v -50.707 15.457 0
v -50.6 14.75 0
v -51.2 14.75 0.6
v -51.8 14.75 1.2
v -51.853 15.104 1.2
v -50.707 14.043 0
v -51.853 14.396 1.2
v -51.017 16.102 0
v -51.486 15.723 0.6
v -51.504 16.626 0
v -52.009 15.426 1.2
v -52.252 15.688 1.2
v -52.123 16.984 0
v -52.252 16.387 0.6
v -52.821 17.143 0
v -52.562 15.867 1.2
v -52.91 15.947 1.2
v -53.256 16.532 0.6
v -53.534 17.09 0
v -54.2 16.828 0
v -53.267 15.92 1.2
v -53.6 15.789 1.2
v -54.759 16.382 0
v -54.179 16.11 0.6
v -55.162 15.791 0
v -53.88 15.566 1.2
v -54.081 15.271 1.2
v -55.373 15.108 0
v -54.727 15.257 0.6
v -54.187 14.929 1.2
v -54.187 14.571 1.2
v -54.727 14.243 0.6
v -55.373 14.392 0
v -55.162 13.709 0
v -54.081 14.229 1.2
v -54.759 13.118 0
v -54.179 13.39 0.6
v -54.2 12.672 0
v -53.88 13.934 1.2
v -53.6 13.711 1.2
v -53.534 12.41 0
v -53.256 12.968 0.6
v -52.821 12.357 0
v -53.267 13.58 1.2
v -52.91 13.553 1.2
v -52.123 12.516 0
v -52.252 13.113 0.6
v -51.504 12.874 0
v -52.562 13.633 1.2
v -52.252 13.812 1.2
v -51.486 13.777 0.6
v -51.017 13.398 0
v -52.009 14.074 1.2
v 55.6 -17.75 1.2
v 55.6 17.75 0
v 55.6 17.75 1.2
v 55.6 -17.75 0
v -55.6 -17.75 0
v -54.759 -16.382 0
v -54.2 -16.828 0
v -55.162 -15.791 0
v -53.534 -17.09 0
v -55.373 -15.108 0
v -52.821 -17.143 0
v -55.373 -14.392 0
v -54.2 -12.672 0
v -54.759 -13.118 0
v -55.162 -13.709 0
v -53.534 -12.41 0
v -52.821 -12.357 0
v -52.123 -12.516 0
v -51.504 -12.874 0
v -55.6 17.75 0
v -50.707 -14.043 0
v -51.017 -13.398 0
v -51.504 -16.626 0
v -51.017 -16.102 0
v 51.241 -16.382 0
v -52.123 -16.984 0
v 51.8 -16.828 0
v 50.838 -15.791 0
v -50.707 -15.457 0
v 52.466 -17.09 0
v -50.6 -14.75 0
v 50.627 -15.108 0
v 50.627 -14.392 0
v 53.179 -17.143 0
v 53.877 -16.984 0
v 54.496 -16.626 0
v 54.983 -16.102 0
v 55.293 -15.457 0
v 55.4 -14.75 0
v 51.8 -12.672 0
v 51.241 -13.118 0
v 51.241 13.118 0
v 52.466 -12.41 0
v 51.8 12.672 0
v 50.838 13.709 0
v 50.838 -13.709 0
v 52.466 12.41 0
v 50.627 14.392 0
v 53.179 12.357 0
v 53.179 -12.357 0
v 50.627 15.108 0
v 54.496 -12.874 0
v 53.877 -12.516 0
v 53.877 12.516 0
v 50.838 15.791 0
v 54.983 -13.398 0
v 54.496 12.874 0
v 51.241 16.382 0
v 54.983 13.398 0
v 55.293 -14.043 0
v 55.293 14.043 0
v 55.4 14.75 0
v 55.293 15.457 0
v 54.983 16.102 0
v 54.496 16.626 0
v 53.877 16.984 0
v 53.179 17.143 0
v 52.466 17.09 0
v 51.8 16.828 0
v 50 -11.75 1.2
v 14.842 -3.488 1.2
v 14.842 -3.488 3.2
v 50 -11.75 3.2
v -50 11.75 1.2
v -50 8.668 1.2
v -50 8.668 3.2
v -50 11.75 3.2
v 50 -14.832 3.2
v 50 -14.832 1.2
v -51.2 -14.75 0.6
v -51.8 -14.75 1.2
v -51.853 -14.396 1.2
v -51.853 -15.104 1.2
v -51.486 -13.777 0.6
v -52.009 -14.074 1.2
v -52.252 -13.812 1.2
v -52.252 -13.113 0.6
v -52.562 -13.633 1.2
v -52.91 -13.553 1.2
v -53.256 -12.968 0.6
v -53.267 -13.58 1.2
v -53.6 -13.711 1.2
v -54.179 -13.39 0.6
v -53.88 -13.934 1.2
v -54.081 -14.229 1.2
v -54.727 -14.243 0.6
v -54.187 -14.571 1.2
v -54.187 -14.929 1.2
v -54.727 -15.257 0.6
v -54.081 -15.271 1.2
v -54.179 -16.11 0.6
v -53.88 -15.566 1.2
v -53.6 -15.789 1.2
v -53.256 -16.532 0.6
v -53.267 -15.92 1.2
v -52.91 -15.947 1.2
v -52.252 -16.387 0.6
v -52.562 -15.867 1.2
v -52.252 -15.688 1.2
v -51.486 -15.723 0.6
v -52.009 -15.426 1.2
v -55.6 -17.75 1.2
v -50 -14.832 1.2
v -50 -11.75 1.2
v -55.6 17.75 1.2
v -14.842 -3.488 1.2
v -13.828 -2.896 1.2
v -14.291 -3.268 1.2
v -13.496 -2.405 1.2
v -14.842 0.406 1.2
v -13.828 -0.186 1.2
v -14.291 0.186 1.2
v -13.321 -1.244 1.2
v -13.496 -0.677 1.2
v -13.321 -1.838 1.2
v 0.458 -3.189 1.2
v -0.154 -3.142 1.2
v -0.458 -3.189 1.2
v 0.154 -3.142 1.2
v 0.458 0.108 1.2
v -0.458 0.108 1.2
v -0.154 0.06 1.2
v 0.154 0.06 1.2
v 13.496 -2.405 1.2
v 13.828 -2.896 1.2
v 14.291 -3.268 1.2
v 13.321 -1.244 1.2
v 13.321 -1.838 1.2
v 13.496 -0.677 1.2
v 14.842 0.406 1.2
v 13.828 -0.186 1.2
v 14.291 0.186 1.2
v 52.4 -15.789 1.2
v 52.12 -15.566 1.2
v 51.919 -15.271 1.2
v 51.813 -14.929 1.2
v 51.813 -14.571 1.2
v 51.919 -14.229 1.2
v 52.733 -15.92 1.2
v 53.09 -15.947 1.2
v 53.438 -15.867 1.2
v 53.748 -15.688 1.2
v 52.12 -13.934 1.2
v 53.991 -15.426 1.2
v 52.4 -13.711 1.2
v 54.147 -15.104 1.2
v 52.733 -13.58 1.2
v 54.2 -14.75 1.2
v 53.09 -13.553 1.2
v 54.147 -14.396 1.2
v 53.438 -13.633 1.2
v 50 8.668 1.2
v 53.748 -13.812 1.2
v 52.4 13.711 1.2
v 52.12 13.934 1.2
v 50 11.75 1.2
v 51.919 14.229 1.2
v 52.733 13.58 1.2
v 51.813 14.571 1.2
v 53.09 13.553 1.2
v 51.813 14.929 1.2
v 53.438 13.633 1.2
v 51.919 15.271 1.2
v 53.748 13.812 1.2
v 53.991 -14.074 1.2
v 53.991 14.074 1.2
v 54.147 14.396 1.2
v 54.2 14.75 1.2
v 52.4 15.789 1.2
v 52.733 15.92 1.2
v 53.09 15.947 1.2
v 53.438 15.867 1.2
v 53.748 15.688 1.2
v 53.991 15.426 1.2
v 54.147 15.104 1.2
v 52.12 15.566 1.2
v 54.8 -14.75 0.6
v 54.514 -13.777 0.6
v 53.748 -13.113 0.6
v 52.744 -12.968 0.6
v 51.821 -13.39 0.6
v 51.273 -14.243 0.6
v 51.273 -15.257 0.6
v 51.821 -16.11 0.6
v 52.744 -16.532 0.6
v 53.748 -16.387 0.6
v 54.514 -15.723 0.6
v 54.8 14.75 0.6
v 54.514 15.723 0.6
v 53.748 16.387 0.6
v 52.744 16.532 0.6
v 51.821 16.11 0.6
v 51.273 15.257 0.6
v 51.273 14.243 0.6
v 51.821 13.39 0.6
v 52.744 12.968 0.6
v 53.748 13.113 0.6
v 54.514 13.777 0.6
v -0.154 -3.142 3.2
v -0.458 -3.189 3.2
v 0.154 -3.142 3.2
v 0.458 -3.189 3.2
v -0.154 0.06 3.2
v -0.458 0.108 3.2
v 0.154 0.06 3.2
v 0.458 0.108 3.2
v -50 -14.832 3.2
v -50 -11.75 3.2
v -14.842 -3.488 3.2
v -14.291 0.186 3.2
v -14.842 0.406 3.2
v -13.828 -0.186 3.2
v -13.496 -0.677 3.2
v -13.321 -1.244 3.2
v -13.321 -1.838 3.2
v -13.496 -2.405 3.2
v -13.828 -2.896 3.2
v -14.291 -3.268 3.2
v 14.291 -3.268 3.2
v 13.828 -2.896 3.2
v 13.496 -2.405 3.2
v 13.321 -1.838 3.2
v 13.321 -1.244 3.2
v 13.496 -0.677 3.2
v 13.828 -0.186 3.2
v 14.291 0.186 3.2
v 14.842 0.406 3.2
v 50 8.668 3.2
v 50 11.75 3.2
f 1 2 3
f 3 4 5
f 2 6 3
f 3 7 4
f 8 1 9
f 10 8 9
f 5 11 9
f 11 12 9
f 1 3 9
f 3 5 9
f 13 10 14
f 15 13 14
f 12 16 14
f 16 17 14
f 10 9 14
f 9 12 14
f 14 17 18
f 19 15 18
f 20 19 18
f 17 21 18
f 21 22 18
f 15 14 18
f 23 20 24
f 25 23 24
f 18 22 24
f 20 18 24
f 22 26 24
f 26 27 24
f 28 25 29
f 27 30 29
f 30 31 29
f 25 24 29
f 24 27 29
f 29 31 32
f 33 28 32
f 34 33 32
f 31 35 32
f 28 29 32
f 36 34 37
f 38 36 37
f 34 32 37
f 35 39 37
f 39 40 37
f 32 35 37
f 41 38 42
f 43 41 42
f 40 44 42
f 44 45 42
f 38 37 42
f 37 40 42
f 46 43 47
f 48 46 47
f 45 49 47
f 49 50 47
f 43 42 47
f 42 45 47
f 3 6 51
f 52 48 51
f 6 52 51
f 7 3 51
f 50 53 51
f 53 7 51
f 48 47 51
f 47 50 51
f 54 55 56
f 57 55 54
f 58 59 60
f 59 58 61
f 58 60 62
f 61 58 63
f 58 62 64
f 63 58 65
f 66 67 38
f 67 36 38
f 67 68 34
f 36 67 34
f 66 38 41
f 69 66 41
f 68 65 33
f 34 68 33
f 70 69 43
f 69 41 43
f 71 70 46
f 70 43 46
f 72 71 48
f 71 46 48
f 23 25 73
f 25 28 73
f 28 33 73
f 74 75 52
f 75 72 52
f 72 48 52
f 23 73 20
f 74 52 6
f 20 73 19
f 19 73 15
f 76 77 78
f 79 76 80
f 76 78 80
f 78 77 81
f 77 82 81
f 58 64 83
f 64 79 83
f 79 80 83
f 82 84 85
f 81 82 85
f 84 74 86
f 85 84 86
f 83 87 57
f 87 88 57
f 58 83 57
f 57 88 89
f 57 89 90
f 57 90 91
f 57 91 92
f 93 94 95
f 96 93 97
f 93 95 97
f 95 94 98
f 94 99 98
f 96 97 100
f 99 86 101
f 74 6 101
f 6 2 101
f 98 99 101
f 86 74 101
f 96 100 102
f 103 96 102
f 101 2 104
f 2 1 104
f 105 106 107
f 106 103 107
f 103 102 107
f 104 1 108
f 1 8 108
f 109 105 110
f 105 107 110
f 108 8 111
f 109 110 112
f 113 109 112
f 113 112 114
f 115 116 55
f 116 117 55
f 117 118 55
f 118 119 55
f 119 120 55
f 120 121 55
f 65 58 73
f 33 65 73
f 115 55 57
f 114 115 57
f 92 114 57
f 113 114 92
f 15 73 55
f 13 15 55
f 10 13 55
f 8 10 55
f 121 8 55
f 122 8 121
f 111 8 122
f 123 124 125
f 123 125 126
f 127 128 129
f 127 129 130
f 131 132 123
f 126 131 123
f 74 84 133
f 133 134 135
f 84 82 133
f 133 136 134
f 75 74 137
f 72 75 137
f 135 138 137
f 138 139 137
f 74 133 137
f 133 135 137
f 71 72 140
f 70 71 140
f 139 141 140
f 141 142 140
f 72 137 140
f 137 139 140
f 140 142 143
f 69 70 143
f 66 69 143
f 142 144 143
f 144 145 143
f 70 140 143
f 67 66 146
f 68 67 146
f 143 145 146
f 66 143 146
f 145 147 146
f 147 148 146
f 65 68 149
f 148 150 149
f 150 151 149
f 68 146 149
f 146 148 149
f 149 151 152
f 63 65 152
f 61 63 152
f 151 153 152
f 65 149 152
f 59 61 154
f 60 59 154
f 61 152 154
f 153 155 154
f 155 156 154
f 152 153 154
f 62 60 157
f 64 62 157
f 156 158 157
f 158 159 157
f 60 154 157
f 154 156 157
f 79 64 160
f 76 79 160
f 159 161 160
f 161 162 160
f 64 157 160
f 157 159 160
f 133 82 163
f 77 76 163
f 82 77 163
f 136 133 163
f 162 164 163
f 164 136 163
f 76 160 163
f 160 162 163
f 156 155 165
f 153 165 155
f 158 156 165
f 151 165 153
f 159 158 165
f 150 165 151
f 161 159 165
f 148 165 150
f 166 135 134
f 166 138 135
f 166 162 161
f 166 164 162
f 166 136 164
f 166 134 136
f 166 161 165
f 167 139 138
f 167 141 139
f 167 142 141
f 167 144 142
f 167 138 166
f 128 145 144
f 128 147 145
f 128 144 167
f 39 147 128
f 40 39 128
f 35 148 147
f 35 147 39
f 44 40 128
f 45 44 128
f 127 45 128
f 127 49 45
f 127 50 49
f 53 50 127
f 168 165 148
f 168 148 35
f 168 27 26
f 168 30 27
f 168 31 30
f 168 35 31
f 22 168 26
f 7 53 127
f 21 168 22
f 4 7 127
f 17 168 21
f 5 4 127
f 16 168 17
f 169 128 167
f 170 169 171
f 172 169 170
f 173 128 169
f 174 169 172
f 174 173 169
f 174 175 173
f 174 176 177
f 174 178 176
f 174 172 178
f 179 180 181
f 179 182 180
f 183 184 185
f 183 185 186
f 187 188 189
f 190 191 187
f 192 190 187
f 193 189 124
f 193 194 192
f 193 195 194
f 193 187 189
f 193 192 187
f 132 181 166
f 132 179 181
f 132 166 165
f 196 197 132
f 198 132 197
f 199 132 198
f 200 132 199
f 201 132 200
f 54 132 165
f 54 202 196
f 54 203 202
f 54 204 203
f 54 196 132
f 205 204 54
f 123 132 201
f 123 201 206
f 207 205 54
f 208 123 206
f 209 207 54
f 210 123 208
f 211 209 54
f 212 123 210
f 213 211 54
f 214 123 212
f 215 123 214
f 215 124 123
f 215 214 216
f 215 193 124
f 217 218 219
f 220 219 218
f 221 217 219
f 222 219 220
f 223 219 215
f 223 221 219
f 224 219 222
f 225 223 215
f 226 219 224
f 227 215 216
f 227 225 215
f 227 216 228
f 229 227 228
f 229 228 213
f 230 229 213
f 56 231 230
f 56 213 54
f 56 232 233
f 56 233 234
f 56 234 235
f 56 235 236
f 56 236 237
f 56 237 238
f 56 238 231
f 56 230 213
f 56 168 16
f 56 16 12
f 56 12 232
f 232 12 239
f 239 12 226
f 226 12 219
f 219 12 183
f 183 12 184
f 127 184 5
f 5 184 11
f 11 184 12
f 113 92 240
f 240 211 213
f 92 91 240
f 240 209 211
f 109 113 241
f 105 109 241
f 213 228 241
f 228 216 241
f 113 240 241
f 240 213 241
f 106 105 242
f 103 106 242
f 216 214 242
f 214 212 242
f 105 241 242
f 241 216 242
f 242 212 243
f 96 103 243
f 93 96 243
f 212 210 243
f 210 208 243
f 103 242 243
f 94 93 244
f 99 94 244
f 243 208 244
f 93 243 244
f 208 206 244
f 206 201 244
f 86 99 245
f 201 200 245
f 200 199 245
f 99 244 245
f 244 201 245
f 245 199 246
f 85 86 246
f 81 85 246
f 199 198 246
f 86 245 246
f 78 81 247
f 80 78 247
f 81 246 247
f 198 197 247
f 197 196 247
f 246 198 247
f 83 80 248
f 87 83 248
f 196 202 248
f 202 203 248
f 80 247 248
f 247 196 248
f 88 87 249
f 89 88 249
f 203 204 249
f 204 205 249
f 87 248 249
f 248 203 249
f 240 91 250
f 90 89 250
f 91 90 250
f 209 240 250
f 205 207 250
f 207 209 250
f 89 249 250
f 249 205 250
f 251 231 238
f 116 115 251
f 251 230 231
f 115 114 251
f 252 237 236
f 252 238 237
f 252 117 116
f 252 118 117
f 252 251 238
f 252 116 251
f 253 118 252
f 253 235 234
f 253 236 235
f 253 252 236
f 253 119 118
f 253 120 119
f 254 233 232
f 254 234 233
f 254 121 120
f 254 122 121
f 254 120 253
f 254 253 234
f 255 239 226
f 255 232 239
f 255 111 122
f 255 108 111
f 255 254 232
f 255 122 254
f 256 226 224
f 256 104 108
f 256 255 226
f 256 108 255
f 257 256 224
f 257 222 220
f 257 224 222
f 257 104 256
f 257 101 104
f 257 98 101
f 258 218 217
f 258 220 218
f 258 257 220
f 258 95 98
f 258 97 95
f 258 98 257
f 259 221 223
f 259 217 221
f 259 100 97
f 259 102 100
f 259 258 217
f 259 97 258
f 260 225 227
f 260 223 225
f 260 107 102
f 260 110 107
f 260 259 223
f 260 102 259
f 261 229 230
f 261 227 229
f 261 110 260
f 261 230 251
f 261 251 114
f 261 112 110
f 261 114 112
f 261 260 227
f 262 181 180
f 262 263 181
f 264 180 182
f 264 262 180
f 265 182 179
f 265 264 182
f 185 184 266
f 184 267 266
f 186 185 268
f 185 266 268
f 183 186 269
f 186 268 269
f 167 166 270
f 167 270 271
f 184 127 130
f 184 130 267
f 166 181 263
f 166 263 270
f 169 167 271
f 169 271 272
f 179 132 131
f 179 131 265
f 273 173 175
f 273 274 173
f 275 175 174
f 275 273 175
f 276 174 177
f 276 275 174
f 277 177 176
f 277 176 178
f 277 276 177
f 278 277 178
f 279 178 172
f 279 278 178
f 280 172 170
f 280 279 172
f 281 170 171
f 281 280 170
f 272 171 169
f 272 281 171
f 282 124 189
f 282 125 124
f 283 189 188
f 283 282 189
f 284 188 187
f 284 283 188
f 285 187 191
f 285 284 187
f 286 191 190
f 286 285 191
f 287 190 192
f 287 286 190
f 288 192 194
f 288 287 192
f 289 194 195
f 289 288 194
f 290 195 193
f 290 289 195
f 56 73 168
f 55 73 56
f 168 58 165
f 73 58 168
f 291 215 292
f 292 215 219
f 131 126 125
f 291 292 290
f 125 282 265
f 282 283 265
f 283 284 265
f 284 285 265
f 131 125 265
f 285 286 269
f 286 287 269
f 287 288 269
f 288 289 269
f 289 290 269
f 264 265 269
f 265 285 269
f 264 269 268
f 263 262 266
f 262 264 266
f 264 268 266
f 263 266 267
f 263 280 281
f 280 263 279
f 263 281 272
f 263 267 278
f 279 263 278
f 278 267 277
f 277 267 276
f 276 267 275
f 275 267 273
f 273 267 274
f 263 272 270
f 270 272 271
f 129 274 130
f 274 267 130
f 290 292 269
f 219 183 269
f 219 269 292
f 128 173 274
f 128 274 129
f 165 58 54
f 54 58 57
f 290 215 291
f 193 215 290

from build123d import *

# Parameters (mm, degrees)
SKETCH1_W                       = 112
SKETCH1_H                       = 35.5
BOSS_EXTRUDE1_DEPTH             = 1.2
SKETCH2_W                       = 6
SKETCH2_H                       = 6
BOSS_EXTRUDE2_DEPTH             = 2
SKETCH3_R                       = 1.1
CUT_EXTRUDE1_DEPTH              = 59.83283522
SKETCH7_W                       = 0.4
SKETCH7_H                       = 35.5
CUT_EXTRUDE5_DEPTH              = 59.83283522
AUFSATZ_LINEAR_AUSTRAGEN2_DEPTH = 2
VERRUNDUNG1_R                   = 2
SKETCH8_W                       = 5.6
SKETCH8_H                       = 35.5
CUT_EXTRUDE7_DEPTH              = 2
CHAMFER1_SIZE                   = 1.3


with BuildPart() as part:
    # Sketch1 → Boss-Extrude1 (new body)
    with BuildSketch(Plane.XY):
        Rectangle(SKETCH1_W, SKETCH1_H)
    extrude(amount=BOSS_EXTRUDE1_DEPTH)

    # Sketch2 → Boss-Extrude2 (add)
    with BuildSketch(Plane.XY.offset(1.2)):
        with Locations((-53, 14.75)):
            Rectangle(SKETCH2_W, SKETCH2_H)
        with Locations((-53, -14.75)):
            Rectangle(SKETCH2_W, SKETCH2_H)
        with Locations((53, -14.75)):
            Rectangle(SKETCH2_W, SKETCH2_H)
        with Locations((53, 14.75)):
            Rectangle(SKETCH2_W, SKETCH2_H)
    extrude(amount=BOSS_EXTRUDE2_DEPTH)

    # Sketch3 → Cut-Extrude1 (cut, through all)
    with BuildSketch(Plane.XY.offset(3.2)):
        with Locations((-53, 14.75)):
            Circle(SKETCH3_R)
        with Locations((-53, -14.75)):
            Circle(SKETCH3_R)
        with Locations((53, -14.75)):
            Circle(SKETCH3_R)
        with Locations((53, 14.75)):
            Circle(SKETCH3_R)
    extrude(amount=-CUT_EXTRUDE1_DEPTH, mode=Mode.SUBTRACT)

    # Sketch7 → Cut-Extrude5 (cut, through all)
    with BuildSketch(Plane(origin=(0, 0, 0), x_dir=(-1, 0, 0), z_dir=(0, 0, -1))):
        with Locations((-55.8, 0)):
            Rectangle(SKETCH7_W, SKETCH7_H)
        with Locations((55.8, 0)):
            Rectangle(SKETCH7_W, SKETCH7_H)
    extrude(amount=-CUT_EXTRUDE5_DEPTH, mode=Mode.SUBTRACT)

    # Skizze5 → Aufsatz-Linear austragen2 (add)
    with BuildSketch(Plane.XY.offset(1.2)):
        Polygon((-50, 11.75), (0, 0), (50, 11.75), (55.6, 11.75), (55.6, 9.984275645), (6.55686033, -1.540862177), (50, -11.75), (50, -14.831724355), (0, -3.081724355), (-50, -14.831724355), (-50, -11.75), (-6.55686033, -1.540862177), (-55.6, 9.984275645), (-55.6, 11.75), align=None)
    extrude(amount=AUFSATZ_LINEAR_AUSTRAGEN2_DEPTH)

    # Verrundung1
    verrundung1_edges = [part.edges().sort_by_distance(p)[0] for p in [
        (-6.55686033, -1.540862177, 2.2),
        (0, -3.081724355, 2.2),
        (6.55686033, -1.540862177, 2.2),
        (0, 0, 2.2),
    ]]
    fillet(verrundung1_edges, radius=VERRUNDUNG1_R)

    # Sketch8 → Cut-Extrude7 (cut)
    with BuildSketch(Plane.XY.offset(1.2)):
        with Locations((-52.8, 0)):
            Rectangle(SKETCH8_W, SKETCH8_H)
        with Locations((52.8, 0)):
            Rectangle(SKETCH8_W, SKETCH8_H)
    extrude(amount=CUT_EXTRUDE7_DEPTH, mode=Mode.SUBTRACT)

    # Chamfer1
    # the kernel refuses this chamfer: 1.3 mm, written as the material it takes off along each edge
    with BuildSketch(Plane(origin=(53, 14.75, 0), x_dir=(1, 0, 0), z_dir=(0, -1, 0))) as chamfer1_piece_1:
        Polygon((1.1, CHAMFER1_SIZE), (1.1 + CHAMFER1_SIZE, 0), (1.1, 0), align=None)
    revolve(axis=Axis((53, 14.75, 0), (0, 0, 1)), mode=Mode.SUBTRACT)
    with BuildSketch(Plane(origin=(-53, -14.75, 0), x_dir=(1, 0, 0), z_dir=(0, -1, 0))) as chamfer1_piece_2:
        Polygon((1.1 + CHAMFER1_SIZE, 0), (1.1, CHAMFER1_SIZE), (1.1, 0), align=None)
    revolve(axis=Axis((-53, -14.75, 0), (0, 0, 1)), mode=Mode.SUBTRACT)
    with BuildSketch(Plane(origin=(-53, 14.75, 0), x_dir=(1, 0, 0), z_dir=(0, -1, 0))) as chamfer1_piece_3:
        Polygon((1.1 + CHAMFER1_SIZE, 0), (1.1, CHAMFER1_SIZE), (1.1, 0), align=None)
    revolve(axis=Axis((-53, 14.75, 0), (0, 0, 1)), mode=Mode.SUBTRACT)
    with BuildSketch(Plane(origin=(53, -14.75, 0), x_dir=(1, 0, 0), z_dir=(0, -1, 0))) as chamfer1_piece_4:
        Polygon((1.1 + CHAMFER1_SIZE, 0), (1.1, CHAMFER1_SIZE), (1.1, 0), align=None)
    revolve(axis=Axis((53, -14.75, 0), (0, 0, 1)), mode=Mode.SUBTRACT)


solid = part.part
